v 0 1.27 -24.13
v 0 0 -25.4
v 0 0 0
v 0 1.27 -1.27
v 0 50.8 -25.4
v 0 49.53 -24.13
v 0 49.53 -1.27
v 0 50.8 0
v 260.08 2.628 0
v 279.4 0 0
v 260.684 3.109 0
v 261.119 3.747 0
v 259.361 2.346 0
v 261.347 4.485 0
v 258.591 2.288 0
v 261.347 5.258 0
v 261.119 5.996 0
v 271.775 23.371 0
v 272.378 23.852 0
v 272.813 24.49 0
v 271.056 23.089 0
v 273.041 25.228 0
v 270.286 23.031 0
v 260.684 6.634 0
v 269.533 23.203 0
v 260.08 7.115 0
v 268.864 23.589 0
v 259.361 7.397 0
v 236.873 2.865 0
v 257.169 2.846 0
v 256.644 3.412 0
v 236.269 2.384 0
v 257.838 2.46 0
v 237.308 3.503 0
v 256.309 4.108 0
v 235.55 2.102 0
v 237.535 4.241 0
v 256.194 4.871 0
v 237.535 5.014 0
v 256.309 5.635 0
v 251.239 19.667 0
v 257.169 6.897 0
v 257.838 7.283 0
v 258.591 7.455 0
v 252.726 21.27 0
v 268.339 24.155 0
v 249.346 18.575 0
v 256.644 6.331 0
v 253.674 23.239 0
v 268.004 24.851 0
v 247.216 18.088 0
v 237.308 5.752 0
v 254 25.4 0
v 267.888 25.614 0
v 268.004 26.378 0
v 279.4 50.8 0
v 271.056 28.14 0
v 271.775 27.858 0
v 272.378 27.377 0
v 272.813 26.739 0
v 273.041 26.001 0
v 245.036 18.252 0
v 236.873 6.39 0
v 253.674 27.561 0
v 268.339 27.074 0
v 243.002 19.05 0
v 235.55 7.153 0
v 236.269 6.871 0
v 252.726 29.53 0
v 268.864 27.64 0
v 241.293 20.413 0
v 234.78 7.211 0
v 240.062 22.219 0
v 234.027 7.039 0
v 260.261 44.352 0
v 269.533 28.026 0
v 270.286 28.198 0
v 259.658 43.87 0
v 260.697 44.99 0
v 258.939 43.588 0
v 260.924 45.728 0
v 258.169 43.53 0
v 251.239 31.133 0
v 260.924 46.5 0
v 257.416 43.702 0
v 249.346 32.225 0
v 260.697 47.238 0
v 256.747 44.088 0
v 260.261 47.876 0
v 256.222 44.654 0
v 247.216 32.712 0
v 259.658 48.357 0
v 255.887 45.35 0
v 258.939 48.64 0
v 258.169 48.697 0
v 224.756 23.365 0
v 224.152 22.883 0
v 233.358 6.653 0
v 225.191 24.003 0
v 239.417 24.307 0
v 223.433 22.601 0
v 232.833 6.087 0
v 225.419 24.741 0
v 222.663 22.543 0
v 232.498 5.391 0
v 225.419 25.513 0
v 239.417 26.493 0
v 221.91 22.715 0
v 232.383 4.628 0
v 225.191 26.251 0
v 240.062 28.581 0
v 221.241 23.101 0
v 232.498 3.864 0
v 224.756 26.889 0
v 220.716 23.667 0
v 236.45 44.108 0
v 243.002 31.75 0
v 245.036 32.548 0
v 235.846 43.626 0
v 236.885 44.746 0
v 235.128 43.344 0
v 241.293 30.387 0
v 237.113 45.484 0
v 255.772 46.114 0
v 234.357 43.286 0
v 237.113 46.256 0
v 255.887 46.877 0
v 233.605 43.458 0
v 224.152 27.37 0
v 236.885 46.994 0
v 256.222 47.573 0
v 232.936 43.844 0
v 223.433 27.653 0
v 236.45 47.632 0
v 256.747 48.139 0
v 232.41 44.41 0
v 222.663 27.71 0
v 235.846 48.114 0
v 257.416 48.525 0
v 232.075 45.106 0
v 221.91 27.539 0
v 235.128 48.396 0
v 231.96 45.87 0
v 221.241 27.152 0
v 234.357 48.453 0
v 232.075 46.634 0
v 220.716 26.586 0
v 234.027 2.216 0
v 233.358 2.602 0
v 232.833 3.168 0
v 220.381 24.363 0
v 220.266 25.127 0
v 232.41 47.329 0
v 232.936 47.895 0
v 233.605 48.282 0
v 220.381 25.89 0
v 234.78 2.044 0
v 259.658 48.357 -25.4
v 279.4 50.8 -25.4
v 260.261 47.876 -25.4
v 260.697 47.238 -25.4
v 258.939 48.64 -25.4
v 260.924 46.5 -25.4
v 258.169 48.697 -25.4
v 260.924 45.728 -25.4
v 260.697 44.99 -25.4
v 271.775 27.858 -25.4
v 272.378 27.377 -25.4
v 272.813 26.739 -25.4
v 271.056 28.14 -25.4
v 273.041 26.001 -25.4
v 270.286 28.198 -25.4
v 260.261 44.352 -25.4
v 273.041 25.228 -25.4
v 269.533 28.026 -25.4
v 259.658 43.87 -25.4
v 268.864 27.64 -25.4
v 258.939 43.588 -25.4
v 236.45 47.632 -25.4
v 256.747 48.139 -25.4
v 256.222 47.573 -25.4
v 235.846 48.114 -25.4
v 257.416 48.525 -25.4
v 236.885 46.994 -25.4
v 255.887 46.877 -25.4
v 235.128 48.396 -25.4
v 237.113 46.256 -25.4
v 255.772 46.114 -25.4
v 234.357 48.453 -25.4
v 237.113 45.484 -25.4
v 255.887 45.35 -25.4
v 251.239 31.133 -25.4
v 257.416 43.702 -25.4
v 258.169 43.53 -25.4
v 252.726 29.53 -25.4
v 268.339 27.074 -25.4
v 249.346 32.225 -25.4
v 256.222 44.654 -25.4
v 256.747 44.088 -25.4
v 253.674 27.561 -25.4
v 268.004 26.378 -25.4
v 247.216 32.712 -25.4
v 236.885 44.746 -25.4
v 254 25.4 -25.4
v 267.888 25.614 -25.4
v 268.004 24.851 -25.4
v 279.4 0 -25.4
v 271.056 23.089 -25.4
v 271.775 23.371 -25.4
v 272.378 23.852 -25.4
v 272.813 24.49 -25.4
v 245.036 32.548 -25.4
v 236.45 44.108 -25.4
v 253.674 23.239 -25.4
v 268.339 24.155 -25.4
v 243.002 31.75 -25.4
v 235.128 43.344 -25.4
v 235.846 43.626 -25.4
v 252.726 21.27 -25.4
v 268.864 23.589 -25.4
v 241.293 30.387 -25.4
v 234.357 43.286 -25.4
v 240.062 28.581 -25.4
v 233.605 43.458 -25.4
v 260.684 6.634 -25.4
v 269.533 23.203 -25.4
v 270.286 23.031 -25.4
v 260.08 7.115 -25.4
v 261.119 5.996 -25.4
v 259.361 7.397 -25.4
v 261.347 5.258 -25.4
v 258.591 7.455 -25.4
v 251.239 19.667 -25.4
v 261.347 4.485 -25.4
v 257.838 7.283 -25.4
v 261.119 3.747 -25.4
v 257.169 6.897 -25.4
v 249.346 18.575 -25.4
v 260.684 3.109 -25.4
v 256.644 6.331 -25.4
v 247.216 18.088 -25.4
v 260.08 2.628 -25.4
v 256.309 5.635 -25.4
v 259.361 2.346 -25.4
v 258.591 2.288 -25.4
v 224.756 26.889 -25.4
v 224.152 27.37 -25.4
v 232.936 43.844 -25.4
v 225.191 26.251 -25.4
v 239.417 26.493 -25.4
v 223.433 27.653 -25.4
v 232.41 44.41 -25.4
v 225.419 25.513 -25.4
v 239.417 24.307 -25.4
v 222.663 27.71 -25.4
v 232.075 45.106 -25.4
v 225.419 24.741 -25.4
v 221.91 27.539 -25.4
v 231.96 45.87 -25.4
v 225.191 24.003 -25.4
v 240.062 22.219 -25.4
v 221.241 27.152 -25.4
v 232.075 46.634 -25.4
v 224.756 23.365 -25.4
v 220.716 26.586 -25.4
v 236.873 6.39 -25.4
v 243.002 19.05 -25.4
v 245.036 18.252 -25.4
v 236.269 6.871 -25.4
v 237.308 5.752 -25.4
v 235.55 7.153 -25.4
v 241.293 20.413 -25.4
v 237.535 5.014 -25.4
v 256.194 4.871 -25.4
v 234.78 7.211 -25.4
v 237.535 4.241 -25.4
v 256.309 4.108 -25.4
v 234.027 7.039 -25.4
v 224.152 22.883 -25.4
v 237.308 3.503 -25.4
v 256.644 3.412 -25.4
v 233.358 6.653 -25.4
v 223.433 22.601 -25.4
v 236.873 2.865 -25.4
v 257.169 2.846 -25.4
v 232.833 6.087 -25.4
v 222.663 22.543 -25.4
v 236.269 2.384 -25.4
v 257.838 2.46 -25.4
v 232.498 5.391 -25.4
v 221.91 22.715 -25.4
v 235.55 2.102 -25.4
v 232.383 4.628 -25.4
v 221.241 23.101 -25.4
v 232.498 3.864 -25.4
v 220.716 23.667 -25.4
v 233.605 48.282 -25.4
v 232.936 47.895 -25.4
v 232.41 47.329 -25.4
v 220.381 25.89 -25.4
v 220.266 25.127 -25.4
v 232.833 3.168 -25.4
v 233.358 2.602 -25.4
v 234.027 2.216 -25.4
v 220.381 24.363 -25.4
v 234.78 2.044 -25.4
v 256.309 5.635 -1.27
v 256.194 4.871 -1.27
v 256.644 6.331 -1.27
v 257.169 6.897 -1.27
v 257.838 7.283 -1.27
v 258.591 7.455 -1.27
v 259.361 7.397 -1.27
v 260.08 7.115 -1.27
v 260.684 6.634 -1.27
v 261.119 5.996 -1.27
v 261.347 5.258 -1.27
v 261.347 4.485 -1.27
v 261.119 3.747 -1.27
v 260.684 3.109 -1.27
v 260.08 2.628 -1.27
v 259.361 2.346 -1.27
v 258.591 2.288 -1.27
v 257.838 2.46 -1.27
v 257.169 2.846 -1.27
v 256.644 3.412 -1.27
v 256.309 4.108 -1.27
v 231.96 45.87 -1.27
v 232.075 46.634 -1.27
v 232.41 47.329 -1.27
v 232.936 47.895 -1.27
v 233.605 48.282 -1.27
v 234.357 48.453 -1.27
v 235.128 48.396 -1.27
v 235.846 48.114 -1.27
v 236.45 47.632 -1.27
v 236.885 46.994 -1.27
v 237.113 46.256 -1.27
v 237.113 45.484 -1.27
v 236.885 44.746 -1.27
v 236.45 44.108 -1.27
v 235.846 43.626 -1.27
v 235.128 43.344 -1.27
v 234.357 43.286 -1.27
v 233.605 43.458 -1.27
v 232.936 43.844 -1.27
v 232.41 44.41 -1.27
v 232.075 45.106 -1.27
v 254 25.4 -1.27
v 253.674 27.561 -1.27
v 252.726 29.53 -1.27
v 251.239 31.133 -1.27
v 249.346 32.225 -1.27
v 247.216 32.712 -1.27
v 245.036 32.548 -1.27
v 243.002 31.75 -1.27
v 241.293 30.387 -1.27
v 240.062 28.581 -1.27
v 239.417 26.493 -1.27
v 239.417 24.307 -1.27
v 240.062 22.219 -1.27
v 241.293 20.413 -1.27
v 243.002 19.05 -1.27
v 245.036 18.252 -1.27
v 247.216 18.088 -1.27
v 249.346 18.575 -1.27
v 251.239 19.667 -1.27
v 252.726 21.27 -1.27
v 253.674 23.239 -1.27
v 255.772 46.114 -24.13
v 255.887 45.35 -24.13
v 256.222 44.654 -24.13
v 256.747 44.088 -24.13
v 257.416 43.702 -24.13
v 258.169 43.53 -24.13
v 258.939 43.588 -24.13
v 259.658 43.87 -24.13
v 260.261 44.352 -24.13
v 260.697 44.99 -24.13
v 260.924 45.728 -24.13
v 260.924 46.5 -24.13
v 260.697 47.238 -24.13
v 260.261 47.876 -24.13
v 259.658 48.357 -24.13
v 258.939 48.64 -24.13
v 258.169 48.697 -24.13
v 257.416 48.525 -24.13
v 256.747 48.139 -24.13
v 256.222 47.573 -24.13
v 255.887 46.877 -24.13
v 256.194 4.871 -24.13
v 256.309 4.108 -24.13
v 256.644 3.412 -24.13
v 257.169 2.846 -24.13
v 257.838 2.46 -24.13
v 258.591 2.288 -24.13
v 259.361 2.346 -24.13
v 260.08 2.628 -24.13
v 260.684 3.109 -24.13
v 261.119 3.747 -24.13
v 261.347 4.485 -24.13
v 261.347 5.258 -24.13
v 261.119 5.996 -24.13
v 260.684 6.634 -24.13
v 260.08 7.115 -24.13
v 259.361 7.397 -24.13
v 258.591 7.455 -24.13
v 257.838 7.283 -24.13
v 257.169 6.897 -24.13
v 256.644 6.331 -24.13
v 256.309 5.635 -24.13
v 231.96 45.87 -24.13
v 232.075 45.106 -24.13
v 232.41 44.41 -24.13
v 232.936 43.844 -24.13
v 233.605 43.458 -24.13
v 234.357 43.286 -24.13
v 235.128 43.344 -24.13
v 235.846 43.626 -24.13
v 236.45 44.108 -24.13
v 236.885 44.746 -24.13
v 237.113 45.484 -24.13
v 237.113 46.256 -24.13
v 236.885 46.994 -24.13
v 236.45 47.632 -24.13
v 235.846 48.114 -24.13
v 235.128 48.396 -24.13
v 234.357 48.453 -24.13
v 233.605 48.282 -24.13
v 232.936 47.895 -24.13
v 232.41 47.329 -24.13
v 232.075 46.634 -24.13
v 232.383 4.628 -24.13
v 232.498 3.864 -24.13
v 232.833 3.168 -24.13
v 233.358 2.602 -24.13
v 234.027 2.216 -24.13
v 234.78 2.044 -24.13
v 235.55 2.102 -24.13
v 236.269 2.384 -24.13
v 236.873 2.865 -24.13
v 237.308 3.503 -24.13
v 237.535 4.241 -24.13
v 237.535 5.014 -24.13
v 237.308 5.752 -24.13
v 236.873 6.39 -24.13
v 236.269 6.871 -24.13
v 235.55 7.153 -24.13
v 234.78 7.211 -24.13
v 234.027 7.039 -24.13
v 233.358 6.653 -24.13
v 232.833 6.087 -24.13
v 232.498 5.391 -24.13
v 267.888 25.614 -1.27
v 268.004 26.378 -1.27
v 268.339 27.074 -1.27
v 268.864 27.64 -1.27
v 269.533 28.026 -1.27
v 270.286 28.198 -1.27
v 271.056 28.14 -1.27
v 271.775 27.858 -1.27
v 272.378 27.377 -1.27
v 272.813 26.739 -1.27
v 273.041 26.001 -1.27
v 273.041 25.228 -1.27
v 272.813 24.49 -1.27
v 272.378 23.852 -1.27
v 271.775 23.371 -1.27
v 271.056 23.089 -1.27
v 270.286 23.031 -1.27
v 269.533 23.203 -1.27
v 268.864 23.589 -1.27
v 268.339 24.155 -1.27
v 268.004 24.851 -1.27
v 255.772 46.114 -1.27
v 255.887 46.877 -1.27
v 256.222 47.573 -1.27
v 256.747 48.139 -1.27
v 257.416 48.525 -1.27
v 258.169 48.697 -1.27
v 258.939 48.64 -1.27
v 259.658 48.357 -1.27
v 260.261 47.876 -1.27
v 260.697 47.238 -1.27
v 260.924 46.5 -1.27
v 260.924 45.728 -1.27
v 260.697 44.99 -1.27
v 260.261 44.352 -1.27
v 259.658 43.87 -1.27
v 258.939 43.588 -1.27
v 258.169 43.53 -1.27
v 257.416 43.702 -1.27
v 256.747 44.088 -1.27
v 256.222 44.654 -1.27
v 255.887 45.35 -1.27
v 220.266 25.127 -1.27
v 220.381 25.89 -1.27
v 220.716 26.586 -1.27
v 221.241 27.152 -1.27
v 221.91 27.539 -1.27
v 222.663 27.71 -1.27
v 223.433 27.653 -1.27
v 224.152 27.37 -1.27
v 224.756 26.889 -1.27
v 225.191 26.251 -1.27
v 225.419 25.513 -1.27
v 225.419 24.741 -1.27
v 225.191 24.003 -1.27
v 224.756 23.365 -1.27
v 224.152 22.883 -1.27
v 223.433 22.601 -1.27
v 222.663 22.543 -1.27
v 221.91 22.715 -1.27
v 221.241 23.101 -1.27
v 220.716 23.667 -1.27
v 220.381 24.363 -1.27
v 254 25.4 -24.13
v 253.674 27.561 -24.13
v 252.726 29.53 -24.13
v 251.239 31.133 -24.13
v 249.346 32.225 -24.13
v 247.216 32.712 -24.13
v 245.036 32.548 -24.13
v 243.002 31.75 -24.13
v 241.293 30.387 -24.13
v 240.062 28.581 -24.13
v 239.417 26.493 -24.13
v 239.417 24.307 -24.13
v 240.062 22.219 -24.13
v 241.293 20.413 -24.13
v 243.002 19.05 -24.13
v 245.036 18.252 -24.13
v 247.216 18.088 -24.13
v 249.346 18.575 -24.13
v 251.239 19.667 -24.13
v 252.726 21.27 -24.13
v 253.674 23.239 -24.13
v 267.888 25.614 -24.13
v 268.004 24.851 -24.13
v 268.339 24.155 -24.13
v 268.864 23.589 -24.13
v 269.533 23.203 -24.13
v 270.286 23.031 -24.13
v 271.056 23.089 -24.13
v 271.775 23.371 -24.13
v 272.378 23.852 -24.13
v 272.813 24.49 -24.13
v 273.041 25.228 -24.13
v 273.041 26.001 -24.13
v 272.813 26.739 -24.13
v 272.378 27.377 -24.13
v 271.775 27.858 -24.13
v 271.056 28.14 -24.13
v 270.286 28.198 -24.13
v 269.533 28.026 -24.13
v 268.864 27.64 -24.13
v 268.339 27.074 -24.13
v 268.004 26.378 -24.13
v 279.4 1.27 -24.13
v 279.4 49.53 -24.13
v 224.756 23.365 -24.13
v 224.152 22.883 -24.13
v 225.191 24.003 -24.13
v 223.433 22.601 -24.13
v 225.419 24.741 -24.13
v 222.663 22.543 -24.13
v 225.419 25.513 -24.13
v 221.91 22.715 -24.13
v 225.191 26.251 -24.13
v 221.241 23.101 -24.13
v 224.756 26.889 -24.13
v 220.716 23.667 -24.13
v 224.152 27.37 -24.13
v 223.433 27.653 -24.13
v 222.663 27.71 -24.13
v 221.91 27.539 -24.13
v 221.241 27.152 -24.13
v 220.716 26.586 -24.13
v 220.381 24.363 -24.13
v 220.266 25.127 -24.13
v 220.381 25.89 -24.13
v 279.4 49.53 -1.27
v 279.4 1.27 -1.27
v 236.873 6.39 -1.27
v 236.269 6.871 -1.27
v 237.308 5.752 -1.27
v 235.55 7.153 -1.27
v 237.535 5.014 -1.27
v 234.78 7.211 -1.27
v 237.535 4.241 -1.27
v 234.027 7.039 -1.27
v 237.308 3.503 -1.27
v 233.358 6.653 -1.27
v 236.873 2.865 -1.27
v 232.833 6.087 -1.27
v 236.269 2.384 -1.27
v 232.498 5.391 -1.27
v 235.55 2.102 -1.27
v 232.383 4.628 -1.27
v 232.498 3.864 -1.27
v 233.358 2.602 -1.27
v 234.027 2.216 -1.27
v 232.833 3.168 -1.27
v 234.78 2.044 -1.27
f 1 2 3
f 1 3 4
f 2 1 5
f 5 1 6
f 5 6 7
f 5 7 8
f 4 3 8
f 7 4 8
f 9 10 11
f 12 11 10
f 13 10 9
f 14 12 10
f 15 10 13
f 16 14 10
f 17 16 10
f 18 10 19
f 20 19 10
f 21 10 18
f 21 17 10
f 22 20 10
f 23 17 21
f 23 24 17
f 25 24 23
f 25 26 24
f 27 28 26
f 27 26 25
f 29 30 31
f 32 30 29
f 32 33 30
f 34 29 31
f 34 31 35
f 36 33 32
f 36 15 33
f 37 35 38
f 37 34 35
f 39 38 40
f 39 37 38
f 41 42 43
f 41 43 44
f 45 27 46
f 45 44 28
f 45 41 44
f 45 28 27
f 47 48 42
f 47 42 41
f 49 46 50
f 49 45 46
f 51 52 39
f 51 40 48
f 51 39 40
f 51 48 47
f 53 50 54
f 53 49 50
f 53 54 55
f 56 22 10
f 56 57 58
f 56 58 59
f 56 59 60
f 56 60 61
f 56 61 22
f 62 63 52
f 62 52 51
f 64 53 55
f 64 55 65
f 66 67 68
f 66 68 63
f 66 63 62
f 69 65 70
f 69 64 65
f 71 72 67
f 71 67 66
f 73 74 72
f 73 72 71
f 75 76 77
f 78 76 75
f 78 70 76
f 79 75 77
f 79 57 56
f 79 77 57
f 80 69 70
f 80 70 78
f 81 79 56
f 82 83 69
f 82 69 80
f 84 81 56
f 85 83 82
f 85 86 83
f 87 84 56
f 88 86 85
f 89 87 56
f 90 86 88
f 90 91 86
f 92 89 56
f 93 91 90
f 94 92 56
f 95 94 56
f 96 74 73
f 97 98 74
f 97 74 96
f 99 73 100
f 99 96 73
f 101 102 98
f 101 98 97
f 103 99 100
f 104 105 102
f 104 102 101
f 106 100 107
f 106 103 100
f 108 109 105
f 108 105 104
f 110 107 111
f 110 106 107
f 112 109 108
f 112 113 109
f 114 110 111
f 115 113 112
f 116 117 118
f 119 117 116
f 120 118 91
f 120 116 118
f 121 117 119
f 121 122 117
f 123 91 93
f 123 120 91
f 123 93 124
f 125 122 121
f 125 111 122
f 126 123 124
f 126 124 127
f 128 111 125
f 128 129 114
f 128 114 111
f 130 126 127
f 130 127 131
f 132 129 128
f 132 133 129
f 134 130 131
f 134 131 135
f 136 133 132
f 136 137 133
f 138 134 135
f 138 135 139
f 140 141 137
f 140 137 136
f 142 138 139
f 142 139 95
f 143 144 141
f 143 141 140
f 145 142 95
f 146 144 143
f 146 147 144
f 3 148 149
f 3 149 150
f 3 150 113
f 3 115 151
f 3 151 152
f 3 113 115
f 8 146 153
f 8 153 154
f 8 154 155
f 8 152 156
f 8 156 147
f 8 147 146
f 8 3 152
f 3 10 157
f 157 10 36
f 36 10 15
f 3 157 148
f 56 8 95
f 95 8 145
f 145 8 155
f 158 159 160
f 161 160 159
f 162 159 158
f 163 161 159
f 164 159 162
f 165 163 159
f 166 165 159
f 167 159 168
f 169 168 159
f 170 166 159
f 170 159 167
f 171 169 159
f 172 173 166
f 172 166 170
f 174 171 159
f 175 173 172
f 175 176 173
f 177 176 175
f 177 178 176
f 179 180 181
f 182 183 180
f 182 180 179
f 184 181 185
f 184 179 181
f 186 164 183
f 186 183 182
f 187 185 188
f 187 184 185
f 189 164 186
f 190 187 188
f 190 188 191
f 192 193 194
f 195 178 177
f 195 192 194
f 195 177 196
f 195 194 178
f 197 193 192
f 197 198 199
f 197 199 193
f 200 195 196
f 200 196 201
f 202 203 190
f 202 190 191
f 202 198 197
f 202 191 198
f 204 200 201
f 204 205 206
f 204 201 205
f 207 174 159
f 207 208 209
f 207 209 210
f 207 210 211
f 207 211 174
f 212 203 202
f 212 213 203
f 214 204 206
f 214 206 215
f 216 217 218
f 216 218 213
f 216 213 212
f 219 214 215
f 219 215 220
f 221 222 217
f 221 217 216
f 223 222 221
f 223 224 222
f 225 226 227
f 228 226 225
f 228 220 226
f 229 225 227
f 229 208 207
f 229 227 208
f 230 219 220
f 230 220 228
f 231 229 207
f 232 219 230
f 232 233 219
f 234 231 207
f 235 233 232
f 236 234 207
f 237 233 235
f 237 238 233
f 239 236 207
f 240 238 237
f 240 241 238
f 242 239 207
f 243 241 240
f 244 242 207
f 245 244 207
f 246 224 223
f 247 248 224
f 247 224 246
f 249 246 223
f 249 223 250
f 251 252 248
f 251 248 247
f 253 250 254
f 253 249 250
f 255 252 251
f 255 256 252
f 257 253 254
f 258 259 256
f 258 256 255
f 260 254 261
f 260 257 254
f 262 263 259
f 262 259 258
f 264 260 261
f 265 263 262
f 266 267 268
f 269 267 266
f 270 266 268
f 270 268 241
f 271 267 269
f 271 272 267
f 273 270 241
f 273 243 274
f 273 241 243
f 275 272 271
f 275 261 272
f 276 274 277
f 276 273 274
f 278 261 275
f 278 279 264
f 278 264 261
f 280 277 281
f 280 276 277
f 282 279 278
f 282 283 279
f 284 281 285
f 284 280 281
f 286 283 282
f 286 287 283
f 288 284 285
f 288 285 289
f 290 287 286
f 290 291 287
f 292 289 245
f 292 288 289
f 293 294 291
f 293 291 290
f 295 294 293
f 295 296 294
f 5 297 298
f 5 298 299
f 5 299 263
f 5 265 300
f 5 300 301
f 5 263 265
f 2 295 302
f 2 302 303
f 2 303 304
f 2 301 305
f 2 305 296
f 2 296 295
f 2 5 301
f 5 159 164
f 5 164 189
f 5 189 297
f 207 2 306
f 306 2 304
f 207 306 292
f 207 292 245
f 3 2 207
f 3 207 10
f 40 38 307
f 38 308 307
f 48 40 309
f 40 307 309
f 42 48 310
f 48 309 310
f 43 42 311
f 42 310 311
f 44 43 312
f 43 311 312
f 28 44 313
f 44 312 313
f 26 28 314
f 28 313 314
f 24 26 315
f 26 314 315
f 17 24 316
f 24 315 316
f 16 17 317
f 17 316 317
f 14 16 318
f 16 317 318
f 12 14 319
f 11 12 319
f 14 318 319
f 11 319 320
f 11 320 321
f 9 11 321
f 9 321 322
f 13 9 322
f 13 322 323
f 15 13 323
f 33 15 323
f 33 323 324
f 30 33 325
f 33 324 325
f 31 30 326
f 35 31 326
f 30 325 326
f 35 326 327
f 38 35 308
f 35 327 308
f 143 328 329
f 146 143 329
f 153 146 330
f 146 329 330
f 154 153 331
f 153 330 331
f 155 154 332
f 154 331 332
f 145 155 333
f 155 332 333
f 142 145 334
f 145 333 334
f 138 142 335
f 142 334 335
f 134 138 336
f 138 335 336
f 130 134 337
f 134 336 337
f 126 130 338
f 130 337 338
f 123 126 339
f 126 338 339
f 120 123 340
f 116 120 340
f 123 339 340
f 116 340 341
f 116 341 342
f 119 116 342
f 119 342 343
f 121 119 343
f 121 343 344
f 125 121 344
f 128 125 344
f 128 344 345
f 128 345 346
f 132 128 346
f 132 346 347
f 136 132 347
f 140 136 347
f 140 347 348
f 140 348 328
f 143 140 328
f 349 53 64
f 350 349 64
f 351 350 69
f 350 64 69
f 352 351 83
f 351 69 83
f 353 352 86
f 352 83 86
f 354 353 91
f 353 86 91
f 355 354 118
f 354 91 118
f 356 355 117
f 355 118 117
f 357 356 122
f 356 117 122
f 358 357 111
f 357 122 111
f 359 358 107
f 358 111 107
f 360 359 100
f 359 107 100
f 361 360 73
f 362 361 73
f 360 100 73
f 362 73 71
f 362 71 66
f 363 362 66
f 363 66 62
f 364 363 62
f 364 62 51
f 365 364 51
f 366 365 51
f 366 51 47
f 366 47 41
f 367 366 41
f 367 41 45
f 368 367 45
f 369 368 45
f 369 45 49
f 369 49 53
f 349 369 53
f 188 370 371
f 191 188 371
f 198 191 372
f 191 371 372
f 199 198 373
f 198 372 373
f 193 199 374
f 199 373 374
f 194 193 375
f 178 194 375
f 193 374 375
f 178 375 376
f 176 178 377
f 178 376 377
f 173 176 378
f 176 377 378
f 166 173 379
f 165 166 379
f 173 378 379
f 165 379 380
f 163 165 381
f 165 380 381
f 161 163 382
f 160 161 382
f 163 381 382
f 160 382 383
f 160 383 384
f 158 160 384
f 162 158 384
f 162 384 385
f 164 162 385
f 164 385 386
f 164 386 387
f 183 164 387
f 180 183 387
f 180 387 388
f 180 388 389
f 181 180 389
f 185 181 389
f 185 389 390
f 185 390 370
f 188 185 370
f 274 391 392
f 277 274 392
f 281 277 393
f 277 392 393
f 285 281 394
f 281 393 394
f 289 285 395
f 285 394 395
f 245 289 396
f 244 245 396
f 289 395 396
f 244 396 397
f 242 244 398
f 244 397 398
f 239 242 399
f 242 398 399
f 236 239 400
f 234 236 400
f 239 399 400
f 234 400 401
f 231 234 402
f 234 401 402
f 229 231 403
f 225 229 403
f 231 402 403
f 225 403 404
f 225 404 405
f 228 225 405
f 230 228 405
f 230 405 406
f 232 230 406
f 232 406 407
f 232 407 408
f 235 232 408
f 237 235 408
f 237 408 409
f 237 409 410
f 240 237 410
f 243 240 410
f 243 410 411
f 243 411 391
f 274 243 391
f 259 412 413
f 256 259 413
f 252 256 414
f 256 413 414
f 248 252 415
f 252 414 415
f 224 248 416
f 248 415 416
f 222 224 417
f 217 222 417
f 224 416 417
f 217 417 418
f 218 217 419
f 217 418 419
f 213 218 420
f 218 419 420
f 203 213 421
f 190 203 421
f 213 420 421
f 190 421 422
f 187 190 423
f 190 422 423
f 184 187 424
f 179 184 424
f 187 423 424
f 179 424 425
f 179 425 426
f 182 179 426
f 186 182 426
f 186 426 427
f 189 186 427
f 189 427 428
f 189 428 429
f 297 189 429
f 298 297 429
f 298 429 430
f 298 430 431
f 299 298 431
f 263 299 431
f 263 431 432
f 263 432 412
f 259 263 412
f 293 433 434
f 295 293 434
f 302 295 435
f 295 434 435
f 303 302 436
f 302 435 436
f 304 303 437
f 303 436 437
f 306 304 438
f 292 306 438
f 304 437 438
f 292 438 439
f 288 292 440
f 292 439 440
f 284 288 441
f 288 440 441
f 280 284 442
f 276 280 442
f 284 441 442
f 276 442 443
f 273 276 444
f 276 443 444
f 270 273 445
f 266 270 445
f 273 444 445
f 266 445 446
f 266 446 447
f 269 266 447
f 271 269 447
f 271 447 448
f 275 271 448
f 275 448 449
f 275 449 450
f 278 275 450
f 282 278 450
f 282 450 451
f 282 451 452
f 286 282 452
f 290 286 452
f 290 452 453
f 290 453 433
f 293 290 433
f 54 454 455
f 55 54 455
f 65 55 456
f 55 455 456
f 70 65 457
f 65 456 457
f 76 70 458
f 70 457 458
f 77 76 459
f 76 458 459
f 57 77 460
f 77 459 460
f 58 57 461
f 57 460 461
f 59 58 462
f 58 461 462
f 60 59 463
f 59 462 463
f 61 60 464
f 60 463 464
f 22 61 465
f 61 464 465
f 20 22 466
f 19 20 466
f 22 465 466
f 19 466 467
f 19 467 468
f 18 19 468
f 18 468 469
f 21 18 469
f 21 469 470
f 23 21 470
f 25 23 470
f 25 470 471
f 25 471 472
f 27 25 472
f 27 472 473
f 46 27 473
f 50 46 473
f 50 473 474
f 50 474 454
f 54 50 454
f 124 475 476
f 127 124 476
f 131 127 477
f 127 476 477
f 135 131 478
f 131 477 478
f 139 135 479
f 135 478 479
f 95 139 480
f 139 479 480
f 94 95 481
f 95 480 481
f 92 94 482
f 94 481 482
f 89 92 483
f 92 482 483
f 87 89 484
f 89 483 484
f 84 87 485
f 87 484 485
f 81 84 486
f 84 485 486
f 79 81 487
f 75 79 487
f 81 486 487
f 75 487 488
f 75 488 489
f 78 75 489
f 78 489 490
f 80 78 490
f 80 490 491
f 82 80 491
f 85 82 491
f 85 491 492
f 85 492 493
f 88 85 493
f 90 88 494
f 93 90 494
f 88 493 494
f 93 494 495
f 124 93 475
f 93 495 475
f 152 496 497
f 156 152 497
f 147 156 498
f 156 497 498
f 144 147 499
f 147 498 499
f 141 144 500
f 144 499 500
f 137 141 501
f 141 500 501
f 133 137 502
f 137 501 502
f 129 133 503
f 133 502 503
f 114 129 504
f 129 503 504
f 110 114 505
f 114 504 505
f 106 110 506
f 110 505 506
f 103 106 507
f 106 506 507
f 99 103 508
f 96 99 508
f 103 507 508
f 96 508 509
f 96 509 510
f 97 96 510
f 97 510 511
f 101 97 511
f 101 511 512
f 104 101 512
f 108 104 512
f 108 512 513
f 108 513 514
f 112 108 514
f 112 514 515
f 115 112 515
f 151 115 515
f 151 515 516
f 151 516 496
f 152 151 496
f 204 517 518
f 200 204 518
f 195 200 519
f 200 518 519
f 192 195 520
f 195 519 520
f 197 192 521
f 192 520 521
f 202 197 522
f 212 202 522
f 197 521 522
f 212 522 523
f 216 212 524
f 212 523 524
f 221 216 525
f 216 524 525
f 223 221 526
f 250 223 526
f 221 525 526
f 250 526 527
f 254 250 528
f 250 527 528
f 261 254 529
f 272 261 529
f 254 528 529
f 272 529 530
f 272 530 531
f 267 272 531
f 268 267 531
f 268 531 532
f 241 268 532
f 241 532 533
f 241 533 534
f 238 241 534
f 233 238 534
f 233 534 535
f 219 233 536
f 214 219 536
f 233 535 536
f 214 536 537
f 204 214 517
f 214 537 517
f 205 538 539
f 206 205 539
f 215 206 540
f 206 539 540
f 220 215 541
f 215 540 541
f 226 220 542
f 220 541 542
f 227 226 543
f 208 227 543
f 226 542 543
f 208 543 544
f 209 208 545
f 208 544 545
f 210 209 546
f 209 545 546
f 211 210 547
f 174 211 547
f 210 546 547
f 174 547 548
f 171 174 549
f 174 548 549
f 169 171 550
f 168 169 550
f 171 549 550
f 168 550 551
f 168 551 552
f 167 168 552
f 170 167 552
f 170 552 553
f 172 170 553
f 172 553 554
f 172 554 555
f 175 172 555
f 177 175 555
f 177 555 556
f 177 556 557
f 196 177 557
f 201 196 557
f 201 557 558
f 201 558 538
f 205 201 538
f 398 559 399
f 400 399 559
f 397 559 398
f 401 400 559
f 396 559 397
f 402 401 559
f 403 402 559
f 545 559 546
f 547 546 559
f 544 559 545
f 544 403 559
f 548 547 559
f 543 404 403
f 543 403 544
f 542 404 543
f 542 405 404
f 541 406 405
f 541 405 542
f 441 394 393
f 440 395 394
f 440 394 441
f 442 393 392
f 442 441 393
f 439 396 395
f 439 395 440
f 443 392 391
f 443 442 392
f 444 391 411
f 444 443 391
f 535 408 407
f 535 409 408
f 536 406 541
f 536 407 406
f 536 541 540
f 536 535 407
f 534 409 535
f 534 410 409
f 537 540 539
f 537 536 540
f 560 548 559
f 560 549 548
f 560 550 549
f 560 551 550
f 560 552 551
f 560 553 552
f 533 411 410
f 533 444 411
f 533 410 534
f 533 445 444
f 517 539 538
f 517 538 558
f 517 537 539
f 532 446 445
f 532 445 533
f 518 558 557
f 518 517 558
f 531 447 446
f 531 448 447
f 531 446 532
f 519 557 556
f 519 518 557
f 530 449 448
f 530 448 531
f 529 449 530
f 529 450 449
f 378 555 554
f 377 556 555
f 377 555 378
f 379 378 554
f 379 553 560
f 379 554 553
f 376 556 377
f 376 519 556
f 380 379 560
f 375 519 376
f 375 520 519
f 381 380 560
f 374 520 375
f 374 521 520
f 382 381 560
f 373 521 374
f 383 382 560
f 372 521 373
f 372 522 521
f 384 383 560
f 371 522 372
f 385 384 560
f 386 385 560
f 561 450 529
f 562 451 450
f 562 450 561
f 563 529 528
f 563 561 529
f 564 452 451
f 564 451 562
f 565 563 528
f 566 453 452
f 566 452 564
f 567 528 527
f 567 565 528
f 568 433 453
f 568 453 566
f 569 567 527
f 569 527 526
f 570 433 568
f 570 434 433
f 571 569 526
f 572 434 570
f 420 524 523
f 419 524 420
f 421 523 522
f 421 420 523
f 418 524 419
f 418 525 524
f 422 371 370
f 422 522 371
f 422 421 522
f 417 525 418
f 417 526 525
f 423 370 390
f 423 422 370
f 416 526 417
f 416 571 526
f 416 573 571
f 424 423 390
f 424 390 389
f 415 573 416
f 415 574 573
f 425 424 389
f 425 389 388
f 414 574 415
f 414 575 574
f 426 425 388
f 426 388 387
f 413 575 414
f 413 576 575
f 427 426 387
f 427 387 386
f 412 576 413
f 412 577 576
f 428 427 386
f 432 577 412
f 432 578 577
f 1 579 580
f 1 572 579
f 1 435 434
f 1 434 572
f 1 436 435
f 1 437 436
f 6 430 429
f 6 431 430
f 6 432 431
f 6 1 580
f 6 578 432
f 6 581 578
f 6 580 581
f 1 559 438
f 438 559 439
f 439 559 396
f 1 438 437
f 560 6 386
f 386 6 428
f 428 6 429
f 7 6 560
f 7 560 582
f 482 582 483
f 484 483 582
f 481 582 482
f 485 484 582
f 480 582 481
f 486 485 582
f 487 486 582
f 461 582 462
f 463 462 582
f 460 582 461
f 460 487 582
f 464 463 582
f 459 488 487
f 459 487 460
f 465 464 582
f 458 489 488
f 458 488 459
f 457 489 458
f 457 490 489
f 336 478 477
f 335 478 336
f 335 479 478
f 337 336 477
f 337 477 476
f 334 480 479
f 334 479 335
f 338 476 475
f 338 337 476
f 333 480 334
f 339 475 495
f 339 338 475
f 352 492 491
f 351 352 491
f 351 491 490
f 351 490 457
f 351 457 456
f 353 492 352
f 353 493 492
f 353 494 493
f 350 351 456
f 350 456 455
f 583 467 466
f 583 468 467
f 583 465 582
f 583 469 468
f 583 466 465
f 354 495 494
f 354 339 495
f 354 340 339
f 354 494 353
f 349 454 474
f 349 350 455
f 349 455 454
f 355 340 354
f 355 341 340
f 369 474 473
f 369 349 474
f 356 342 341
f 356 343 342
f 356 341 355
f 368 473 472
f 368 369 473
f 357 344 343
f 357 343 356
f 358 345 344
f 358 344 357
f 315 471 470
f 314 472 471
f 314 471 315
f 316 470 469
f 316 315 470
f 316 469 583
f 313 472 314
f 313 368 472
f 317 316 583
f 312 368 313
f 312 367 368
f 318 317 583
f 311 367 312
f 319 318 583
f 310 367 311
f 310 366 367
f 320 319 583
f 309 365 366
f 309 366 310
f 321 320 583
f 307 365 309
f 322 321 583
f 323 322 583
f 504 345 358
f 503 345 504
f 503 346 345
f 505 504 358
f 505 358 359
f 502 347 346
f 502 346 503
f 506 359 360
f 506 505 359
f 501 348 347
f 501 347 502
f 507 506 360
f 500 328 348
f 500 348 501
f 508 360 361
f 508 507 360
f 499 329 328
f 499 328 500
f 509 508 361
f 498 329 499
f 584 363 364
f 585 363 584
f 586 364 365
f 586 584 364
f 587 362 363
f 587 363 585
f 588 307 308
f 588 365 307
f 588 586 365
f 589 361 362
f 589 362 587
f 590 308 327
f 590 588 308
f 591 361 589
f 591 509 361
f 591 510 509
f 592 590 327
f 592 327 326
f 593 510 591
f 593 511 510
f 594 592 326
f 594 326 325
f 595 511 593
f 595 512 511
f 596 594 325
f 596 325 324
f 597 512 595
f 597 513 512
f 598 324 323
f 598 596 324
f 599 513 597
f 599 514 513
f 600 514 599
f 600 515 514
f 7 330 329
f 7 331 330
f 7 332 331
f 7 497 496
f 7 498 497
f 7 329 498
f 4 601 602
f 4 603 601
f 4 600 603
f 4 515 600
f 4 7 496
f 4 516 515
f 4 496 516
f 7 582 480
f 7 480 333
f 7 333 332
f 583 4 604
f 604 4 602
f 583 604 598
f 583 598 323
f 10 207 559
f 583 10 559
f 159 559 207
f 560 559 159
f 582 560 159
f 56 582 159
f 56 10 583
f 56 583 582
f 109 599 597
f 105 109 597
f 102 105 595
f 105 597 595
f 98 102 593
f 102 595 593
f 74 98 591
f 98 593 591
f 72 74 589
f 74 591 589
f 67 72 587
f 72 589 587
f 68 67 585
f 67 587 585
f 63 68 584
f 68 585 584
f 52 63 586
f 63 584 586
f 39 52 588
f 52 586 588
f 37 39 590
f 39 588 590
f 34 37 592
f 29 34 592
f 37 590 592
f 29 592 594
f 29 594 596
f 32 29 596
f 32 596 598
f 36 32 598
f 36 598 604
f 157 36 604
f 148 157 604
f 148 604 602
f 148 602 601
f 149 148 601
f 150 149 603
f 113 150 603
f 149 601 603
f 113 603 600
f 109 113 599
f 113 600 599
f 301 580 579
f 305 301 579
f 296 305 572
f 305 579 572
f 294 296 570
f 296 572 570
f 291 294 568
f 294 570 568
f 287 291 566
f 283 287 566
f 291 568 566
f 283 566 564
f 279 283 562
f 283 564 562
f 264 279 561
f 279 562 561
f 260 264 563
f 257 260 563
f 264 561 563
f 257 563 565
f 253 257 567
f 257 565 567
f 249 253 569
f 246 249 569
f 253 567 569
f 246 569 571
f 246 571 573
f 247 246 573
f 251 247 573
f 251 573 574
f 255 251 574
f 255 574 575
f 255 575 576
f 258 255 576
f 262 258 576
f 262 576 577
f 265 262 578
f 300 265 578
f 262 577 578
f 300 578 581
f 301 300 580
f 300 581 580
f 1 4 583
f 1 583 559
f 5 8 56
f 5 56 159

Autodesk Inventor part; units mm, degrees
ref_plane "YZ Plane" through (0, 0, 0) normal (1, 0, 0) x (0, 1, 0)
ref_plane "XZ Plane" through (0, 0, 0) normal (0, 1, 0) x (-1, 0, 0)
ref_plane "XY Plane" through (0, 0, 0) normal (0, 0, 1) x (1, 0, 0)
sketch "Sketch1" plane through (0, 0, 0) normal (1, 0, 0) x (0, 1, 0)
  line L0 (0, 0) -> (50.8, 0)
  line L1 (50.8, 0) -> (50.8, -25.4)
  line L2 (50.8, -25.4) -> (0, -25.4)
  line L3 (0, -25.4) -> (0, 0)
  line L4 (49.53, -1.27) -> (1.27, -1.27)
  line L5 (1.27, -1.27) -> (1.27, -24.13)
  line L6 (1.27, -24.13) -> (49.53, -24.13)
  line L7 (49.53, -24.13) -> (49.53, -1.27)
  dimension "d0" = 50.8
  dimension "d1" = 25.4
  dimension "d2" = 1.27
extrude "Extrusion1" add sketch "Sketch1" along normal blind 279.4
sketch "Sketch2" plane through (0, 0, 0) normal (0, 0, 1) x (1, 0, 0)
  circle A0 centre (246.6677, 25.4) radius 7.3323
  point P0 (0, 0)
extrude "Extrusion2" cut sketch "Sketch2" against normal through all
sketch "Sketch3" plane through (279.4, 49.53, -1.27) normal (0, 0, -1) x (-1, 0, 0)
  circle A0 centre (8.9208, -23.9155) radius 2.5908
  circle A1 centre (21.0377, -3.4163) radius 2.5908
  circle A2 centre (20.6153, -44.6586) radius 2.5908
  circle A3 centre (56.5433, -24.4032) radius 2.5908
  circle A4 centre (44.4265, -44.9024) radius 2.5908
  circle A5 centre (44.8489, -3.6601) radius 2.5908
  point P0 (279.4, -49.53)
extrude "Extrusion3" cut sketch "Sketch3" along normal through all both and the other way through all
properties part number "Aluminum grabber mount"
